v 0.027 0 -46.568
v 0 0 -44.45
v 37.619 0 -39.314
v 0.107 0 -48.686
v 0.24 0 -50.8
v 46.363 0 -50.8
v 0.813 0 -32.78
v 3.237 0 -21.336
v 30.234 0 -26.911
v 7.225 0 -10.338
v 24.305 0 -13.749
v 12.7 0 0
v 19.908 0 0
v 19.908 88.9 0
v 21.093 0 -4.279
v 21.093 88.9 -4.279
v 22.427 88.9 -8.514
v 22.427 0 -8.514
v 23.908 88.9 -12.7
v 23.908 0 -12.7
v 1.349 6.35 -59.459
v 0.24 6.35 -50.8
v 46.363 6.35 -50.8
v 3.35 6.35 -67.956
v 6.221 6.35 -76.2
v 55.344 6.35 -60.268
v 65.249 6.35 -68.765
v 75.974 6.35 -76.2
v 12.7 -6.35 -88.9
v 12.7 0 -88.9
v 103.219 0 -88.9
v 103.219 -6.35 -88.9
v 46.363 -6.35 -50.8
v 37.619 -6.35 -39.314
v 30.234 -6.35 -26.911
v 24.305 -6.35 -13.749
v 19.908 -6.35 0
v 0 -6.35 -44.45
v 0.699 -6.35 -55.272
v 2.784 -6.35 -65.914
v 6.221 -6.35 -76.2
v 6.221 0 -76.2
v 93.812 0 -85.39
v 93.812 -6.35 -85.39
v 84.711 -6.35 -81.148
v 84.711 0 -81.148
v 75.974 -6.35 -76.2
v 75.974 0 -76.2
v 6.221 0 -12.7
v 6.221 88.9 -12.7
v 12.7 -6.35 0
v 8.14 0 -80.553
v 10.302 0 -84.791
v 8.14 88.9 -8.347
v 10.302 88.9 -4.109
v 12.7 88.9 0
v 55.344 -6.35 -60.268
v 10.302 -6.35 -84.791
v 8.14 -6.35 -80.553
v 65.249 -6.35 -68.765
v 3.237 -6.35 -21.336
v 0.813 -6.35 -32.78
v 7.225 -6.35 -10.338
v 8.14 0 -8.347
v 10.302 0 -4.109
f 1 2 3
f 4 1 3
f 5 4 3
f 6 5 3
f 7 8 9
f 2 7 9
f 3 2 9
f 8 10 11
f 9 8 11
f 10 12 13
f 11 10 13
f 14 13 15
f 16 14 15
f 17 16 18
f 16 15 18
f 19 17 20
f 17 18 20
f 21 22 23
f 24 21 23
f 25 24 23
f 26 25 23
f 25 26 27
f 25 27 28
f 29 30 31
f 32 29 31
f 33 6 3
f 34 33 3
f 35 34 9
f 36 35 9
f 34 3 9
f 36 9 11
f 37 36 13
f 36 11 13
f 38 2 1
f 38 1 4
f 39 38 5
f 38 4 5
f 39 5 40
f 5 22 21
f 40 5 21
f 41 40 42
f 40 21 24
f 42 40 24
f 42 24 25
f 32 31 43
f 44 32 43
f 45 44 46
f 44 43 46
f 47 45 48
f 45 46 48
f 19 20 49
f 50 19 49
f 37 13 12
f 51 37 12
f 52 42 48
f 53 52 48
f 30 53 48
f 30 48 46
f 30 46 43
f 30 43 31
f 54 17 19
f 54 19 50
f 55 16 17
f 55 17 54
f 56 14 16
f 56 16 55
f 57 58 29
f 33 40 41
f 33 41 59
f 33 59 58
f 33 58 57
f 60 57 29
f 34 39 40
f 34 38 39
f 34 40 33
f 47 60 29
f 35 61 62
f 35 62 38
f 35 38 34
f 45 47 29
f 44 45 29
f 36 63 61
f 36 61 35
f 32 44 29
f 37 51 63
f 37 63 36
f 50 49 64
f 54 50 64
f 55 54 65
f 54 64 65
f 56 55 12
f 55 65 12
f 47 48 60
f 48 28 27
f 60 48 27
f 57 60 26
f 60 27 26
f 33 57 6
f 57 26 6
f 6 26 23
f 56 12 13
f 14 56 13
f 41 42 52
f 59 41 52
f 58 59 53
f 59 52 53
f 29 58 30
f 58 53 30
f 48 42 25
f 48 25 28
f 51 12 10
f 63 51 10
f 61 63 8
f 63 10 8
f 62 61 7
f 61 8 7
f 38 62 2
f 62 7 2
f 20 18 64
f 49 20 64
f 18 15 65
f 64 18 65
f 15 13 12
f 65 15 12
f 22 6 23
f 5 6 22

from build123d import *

# Parameters (mm, degrees)
F1_DEPTH = 6.35
F3_DEPTH = 12.7
F5_DEPTH = 88.9


with BuildPart() as f1:
    # F0 (on Front) → F1 (new body)
    with BuildSketch(Plane.XZ):
        with BuildLine():
            ThreePointArc((12.7, 0), (3.2372788554, -21.3356511015), (0, -44.45))
            ThreePointArc((0, -44.45), (0.0600126121, -47.6272662433), (0.2399648381, -50.8))
            Line((0.2399648381, -50.8), (46.3633556248, -50.8))
            ThreePointArc((46.3633556248, -50.8), (30.2344073473, -26.9108633319), (19.9077787579, 0))
            Line((19.9077787579, 0), (12.7, 0))
        make_face()
        with BuildLine():
            Line((46.3633556248, -50.8), (0.2399648381, -50.8))
            ThreePointArc((0.2399648381, -50.8), (2.2395472881, -63.7332634128), (6.220515932, -76.2))
            Line((6.220515932, -76.2), (75.9735986694, -76.2))
            ThreePointArc((75.9735986694, -76.2), (60.1873595892, -64.6437452498), (46.3633556248, -50.8))
        make_face()
        with BuildLine():
            ThreePointArc((6.220515932, -76.2), (9.1907657296, -82.6874937522), (12.7, -88.9))
            Line((12.7, -88.9), (13.0139251954, -88.9))
            Line((13.0139251954, -88.9), (103.2192627102, -88.9))
            ThreePointArc((103.2192627102, -88.9), (89.2193530675, -83.3589551349), (75.9735986694, -76.2))
            Line((75.9735986694, -76.2), (6.220515932, -76.2))
        make_face()
    extrude(amount=F1_DEPTH)

    # F2 (on face) → F3 (join)
    with BuildSketch(Plane.XZ.offset(6.35)):
        with BuildLine():
            ThreePointArc((0.2399648381, -50.8), (2.2395472881, -63.7332634128), (6.220515932, -76.2))
            Line((6.220515932, -76.2), (75.9735986694, -76.2))
            ThreePointArc((75.9735986694, -76.2), (60.1873595892, -64.6437452498), (46.3633556248, -50.8))
            Line((46.3633556248, -50.8), (0.2399648381, -50.8))
        make_face()
    extrude(amount=-F3_DEPTH)


with BuildPart() as f5:
    # F4 (on face) → F5 (new body)
    with BuildSketch(Plane(origin=(0, 0, 0), x_dir=(-1, 0, 0), z_dir=(0, 1, 0))):
        with BuildLine():
            ThreePointArc((-19.9077787579, 0), (-21.741231045, -6.4024575715), (-23.9077881305, -12.7))
            Line((-23.9077881305, -12.7), (-6.220515932, -12.7))
            ThreePointArc((-6.220515932, -12.7), (-9.1907657296, -6.2125062478), (-12.7, 0))
            Line((-12.7, 0), (-19.9077787579, 0))
        make_face()
    extrude(amount=F5_DEPTH)


solid = Compound([f1.part, f5.part])
